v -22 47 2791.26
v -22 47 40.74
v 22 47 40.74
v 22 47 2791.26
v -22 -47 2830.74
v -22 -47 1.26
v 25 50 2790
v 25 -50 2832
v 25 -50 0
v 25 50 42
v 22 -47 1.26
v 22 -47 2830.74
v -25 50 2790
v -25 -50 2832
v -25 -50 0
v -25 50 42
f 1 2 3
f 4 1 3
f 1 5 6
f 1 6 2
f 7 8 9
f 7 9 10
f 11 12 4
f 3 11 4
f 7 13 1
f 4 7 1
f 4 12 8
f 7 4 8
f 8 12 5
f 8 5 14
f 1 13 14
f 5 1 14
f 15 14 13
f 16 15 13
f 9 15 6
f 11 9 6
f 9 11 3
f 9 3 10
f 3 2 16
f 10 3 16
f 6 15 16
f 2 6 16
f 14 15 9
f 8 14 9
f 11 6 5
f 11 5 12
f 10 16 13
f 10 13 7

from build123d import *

# Parameters (mm, degrees)
F0_W        = 50
F0_H        = 100
F0_W_2      = 44
F0_H_2      = 94
F1_DEPTH    = 2832
F2_T1_DEPTH = 568.4974851551
F3_T1_DEPTH = 568.4974851551


# Not quite as in the source:
# - a fillet or chamfer that OpenCascade refuses, or shapes differently, is made with other operations: its cross-section is extruded or revolved along the edge and cut away or added


with BuildPart() as f1:
    # F0 (on Top) → F1 (new body)
    with BuildSketch(Plane.XY):
        Rectangle(F0_W, F0_H)
        Rectangle(F0_W_2, F0_H_2, mode=Mode.SUBTRACT)
    extrude(amount=F1_DEPTH)

    # F2: chamfer of 100 x 42 on 1 edges, made by hand

    # F2_s2 → F2_t1 (cut)
    with BuildSketch(Plane.YZ.offset(-284.2487425775)):
        Polygon((50, 2790), (-50, 2832), (50, 2832), align=None)
    extrude(amount=F2_T1_DEPTH, mode=Mode.SUBTRACT)

    # F3: chamfer of 42 x 100 on 1 edges, made by hand

    # F3_s2 → F3_t1 (cut)
    with BuildSketch(Plane.YZ.offset(-284.2487425775)):
        Polygon((-50, 0), (50, 42), (50, 0), align=None)
    extrude(amount=F3_T1_DEPTH, mode=Mode.SUBTRACT)


solid = f1.part
